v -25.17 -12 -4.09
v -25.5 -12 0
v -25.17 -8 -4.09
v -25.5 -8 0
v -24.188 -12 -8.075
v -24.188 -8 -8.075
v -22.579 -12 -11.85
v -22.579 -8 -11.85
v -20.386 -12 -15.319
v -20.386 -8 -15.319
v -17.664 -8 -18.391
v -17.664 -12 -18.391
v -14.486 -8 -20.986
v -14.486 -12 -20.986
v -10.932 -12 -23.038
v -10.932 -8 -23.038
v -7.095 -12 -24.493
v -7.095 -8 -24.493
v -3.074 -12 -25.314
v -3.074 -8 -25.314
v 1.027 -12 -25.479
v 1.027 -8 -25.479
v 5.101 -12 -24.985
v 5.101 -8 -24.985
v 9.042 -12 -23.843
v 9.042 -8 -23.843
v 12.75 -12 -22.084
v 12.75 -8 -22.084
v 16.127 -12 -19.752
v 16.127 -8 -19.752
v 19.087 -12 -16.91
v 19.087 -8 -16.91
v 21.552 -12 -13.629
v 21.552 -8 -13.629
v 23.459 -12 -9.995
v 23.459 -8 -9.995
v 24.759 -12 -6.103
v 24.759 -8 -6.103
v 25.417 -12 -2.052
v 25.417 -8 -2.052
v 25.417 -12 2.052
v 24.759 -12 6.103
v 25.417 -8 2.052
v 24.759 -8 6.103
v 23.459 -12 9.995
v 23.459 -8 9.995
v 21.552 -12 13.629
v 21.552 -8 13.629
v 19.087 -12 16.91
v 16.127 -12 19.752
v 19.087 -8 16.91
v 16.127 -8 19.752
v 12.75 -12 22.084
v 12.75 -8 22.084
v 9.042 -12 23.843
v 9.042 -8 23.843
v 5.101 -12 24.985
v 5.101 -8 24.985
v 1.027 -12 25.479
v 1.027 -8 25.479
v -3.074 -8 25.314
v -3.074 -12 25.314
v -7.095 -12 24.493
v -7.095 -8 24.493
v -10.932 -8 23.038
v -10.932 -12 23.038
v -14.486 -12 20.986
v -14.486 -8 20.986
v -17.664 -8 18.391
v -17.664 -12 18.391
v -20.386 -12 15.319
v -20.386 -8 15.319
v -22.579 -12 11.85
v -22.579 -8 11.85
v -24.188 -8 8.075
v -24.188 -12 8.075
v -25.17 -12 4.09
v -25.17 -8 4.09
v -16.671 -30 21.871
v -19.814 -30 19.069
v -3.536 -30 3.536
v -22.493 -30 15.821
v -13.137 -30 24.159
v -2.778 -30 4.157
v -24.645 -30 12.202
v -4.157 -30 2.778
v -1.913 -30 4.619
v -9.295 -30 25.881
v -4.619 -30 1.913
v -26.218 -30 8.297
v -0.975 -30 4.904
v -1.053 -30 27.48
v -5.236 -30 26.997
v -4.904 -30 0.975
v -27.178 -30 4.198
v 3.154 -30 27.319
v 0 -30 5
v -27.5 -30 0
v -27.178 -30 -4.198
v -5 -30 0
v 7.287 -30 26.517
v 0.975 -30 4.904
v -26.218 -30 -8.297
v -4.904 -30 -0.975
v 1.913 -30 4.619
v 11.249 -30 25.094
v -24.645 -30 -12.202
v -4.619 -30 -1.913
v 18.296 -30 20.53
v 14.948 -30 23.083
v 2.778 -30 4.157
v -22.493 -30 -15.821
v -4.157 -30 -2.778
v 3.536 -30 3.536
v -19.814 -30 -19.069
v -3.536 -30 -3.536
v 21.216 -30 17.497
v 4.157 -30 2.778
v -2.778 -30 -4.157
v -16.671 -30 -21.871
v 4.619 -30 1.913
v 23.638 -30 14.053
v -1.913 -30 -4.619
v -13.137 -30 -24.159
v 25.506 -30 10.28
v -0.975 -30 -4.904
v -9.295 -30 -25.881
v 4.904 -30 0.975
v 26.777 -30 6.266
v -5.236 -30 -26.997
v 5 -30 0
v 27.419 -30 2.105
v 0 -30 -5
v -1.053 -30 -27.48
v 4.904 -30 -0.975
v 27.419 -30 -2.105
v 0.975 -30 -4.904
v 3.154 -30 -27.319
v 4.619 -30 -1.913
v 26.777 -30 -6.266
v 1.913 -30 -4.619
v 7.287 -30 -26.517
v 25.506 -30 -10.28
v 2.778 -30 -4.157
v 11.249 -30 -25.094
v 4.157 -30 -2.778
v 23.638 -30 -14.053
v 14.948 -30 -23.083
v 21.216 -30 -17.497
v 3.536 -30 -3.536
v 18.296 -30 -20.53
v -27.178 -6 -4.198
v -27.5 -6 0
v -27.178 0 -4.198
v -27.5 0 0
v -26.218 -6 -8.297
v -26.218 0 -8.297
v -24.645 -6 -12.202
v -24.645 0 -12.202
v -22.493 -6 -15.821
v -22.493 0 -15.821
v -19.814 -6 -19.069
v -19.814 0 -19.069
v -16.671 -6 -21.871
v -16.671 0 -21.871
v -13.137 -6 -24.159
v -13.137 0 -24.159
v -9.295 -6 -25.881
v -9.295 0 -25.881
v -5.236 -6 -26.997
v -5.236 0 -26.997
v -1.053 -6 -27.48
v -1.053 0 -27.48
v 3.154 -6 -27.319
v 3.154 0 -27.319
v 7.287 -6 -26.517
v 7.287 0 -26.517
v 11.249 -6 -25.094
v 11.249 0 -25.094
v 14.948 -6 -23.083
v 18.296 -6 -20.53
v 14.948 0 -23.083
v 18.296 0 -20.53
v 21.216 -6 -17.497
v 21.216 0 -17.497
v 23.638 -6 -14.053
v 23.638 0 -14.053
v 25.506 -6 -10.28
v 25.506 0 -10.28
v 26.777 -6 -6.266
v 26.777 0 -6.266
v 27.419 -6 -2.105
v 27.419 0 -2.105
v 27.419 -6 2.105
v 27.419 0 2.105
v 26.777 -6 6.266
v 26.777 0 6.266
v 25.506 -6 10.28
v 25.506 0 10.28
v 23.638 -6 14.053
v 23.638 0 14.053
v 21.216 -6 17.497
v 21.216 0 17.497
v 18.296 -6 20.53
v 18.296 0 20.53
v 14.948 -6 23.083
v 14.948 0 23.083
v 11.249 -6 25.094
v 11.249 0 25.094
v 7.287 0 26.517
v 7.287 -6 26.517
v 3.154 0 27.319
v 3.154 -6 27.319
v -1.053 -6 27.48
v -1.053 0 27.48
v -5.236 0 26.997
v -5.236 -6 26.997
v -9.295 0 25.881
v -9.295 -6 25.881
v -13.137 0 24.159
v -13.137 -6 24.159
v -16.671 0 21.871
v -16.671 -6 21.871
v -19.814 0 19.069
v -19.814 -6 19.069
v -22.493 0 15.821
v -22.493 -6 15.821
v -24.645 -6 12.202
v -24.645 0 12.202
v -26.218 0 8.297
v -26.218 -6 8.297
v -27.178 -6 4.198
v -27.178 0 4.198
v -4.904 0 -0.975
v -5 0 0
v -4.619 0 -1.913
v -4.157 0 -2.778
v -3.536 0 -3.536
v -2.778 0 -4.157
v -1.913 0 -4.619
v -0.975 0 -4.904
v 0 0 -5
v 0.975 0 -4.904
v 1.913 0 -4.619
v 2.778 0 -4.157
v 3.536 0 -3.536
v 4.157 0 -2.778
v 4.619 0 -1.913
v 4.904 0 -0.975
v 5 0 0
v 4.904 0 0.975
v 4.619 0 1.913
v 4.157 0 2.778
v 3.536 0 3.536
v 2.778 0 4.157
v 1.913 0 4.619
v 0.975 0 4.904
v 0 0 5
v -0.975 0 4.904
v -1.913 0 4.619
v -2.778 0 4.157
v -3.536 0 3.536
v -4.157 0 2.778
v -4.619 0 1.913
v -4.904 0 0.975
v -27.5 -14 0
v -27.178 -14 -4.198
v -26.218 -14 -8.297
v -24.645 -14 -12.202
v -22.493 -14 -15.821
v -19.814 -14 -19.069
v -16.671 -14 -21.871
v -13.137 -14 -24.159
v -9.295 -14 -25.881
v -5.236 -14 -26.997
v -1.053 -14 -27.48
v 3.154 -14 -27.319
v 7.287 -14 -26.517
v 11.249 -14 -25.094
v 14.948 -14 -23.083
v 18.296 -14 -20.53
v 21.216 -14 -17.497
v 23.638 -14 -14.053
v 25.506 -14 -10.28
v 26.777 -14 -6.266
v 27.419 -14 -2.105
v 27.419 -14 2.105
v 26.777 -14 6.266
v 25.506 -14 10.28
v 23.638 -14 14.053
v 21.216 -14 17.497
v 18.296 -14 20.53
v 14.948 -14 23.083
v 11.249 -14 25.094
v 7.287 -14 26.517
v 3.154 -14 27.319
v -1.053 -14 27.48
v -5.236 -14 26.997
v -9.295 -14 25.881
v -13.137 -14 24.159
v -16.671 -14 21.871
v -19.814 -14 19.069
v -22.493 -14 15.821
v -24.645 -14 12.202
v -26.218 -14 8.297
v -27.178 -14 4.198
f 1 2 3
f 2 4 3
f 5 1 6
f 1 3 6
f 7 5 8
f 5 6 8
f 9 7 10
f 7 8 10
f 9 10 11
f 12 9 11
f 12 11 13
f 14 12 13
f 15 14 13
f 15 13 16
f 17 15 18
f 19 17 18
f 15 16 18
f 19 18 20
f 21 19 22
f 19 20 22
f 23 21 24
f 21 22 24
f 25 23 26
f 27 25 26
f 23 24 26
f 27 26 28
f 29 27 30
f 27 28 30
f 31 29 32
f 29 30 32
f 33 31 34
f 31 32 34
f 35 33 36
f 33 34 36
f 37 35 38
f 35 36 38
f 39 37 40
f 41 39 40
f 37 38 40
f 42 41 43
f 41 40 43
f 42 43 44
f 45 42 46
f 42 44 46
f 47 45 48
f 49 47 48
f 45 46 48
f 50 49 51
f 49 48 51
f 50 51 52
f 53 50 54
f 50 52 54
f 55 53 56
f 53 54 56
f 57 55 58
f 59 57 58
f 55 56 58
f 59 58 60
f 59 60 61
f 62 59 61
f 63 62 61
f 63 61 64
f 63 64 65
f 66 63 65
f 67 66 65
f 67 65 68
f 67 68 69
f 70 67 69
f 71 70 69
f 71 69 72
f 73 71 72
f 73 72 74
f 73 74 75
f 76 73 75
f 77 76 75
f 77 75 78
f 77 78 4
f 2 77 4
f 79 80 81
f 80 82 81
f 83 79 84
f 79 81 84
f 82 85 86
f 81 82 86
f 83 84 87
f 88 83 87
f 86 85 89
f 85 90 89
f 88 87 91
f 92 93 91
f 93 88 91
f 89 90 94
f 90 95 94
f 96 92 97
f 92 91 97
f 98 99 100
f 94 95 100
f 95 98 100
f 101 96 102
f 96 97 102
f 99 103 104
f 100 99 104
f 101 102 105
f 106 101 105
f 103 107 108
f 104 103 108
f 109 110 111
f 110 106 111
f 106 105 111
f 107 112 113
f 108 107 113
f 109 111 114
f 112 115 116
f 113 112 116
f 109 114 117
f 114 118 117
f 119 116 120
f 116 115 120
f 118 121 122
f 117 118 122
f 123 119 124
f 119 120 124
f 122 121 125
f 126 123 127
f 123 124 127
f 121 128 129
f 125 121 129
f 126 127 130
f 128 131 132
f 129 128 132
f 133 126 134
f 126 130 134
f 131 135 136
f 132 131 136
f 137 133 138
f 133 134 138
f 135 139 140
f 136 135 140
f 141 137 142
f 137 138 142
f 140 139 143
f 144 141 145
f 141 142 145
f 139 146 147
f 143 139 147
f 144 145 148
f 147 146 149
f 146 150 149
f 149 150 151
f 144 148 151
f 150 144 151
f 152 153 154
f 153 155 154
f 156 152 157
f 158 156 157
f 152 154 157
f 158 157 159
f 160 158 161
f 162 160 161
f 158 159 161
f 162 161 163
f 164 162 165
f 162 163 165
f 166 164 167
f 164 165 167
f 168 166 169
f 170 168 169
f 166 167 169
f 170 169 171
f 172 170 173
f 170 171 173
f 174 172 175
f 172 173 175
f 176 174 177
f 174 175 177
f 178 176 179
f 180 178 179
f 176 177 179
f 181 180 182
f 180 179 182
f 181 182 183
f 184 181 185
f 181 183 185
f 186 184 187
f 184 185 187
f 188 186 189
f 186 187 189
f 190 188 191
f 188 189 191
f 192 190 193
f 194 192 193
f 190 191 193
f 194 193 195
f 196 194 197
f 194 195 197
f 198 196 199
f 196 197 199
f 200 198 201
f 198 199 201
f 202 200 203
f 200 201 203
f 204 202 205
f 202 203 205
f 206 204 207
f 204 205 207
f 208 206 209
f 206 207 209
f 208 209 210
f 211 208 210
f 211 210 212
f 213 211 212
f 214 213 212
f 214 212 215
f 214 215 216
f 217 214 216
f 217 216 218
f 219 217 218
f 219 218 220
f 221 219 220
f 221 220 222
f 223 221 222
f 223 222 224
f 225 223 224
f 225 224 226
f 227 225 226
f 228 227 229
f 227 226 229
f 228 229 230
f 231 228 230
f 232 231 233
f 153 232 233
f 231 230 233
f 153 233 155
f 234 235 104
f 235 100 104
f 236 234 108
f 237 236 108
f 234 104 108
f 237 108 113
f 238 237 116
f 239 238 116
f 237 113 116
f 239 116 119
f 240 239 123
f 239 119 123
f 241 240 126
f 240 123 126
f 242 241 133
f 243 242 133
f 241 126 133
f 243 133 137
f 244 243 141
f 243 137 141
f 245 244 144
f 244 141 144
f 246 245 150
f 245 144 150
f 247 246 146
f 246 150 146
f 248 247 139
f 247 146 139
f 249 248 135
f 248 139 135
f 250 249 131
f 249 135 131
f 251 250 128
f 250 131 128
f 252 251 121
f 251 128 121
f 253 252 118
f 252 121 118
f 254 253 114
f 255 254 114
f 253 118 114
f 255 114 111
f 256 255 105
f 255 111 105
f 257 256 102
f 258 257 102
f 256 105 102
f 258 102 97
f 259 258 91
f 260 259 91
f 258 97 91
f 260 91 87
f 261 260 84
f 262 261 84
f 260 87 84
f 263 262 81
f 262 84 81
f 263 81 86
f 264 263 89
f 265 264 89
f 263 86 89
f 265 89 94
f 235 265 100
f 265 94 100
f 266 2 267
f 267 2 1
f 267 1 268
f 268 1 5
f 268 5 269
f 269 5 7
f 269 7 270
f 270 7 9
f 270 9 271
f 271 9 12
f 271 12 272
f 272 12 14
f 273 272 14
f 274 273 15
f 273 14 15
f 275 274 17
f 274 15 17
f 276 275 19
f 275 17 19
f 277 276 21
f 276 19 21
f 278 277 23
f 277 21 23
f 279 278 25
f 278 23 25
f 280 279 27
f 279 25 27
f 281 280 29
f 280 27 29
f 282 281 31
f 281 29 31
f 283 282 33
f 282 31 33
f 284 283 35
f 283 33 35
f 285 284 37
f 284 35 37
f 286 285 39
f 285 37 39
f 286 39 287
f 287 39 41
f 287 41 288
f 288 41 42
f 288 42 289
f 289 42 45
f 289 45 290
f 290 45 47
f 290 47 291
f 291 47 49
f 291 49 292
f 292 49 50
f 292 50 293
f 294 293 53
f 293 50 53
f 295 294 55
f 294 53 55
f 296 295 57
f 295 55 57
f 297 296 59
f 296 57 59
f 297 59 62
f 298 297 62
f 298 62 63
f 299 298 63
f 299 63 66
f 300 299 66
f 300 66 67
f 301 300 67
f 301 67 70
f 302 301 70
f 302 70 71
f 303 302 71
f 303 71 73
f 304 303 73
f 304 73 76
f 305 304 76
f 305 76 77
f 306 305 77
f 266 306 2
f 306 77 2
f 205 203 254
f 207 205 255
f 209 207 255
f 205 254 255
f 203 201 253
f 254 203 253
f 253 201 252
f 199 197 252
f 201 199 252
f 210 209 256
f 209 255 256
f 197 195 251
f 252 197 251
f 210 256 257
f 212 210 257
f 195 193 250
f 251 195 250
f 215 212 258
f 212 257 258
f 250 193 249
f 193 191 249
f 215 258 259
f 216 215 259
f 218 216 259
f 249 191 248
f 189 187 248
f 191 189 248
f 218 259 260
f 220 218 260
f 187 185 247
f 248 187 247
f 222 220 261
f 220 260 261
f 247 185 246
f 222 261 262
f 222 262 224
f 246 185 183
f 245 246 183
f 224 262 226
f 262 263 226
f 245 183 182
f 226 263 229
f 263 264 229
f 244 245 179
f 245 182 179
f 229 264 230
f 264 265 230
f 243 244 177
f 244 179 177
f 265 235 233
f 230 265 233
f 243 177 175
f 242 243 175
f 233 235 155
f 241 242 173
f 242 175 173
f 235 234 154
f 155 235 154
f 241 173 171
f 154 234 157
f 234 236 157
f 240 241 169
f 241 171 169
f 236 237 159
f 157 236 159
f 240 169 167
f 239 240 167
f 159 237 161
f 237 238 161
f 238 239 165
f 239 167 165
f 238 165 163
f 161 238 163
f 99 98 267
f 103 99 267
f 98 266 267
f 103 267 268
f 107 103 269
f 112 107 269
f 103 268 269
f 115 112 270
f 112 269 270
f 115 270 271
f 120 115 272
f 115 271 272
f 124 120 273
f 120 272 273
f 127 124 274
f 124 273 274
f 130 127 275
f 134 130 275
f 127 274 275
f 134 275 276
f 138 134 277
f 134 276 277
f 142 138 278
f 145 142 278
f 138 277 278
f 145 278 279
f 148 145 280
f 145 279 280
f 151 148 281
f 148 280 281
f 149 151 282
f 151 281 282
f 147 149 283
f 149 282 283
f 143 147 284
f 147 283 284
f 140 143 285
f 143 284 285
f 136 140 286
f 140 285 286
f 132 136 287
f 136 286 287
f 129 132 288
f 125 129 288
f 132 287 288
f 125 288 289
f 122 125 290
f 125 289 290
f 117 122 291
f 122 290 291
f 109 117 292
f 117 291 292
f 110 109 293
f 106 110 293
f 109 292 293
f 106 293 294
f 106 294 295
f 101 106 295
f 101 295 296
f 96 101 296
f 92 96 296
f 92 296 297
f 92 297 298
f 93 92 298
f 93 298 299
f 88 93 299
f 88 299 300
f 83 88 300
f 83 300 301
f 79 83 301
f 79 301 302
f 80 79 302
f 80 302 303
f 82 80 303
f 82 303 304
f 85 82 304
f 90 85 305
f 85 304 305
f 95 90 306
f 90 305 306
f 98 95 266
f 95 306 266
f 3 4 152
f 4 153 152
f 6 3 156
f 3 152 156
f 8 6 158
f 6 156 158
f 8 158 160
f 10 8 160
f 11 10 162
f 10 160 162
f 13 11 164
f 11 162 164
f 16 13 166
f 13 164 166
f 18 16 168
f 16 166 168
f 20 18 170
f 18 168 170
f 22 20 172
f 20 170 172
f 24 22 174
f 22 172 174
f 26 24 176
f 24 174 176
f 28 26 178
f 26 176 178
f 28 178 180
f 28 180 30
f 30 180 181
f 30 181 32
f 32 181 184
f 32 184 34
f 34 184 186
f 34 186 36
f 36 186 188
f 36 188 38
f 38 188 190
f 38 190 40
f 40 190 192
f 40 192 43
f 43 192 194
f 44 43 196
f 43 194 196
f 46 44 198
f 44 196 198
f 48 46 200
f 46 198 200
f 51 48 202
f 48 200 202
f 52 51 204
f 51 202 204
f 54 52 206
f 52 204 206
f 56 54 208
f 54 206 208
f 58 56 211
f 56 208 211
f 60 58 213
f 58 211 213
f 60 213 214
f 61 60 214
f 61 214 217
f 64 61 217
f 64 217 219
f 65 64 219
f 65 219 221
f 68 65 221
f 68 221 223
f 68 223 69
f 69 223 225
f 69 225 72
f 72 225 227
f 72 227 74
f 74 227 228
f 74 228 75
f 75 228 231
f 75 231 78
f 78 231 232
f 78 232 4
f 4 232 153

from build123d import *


with BuildPart() as part:
    # Esboço1 → Revolução1 (revolve)
    with BuildSketch(Plane.XY, mode=Mode.PRIVATE) as revolu_o1_sk:
        Polygon((5, 0), (5, -30), (27.5, -30), (27.5, -14), (25.5, -12), (25.5, -8), (27.5, -6), (27.5, 0), align=None)
    revolve(revolu_o1_sk.sketch.rotate(Axis((0, 0, 0), (0, -1, 0)), 180), axis=Axis((0, 0, 0), (0, -1, 0)))  # turned: the seam where the file's is


solid = part.part
